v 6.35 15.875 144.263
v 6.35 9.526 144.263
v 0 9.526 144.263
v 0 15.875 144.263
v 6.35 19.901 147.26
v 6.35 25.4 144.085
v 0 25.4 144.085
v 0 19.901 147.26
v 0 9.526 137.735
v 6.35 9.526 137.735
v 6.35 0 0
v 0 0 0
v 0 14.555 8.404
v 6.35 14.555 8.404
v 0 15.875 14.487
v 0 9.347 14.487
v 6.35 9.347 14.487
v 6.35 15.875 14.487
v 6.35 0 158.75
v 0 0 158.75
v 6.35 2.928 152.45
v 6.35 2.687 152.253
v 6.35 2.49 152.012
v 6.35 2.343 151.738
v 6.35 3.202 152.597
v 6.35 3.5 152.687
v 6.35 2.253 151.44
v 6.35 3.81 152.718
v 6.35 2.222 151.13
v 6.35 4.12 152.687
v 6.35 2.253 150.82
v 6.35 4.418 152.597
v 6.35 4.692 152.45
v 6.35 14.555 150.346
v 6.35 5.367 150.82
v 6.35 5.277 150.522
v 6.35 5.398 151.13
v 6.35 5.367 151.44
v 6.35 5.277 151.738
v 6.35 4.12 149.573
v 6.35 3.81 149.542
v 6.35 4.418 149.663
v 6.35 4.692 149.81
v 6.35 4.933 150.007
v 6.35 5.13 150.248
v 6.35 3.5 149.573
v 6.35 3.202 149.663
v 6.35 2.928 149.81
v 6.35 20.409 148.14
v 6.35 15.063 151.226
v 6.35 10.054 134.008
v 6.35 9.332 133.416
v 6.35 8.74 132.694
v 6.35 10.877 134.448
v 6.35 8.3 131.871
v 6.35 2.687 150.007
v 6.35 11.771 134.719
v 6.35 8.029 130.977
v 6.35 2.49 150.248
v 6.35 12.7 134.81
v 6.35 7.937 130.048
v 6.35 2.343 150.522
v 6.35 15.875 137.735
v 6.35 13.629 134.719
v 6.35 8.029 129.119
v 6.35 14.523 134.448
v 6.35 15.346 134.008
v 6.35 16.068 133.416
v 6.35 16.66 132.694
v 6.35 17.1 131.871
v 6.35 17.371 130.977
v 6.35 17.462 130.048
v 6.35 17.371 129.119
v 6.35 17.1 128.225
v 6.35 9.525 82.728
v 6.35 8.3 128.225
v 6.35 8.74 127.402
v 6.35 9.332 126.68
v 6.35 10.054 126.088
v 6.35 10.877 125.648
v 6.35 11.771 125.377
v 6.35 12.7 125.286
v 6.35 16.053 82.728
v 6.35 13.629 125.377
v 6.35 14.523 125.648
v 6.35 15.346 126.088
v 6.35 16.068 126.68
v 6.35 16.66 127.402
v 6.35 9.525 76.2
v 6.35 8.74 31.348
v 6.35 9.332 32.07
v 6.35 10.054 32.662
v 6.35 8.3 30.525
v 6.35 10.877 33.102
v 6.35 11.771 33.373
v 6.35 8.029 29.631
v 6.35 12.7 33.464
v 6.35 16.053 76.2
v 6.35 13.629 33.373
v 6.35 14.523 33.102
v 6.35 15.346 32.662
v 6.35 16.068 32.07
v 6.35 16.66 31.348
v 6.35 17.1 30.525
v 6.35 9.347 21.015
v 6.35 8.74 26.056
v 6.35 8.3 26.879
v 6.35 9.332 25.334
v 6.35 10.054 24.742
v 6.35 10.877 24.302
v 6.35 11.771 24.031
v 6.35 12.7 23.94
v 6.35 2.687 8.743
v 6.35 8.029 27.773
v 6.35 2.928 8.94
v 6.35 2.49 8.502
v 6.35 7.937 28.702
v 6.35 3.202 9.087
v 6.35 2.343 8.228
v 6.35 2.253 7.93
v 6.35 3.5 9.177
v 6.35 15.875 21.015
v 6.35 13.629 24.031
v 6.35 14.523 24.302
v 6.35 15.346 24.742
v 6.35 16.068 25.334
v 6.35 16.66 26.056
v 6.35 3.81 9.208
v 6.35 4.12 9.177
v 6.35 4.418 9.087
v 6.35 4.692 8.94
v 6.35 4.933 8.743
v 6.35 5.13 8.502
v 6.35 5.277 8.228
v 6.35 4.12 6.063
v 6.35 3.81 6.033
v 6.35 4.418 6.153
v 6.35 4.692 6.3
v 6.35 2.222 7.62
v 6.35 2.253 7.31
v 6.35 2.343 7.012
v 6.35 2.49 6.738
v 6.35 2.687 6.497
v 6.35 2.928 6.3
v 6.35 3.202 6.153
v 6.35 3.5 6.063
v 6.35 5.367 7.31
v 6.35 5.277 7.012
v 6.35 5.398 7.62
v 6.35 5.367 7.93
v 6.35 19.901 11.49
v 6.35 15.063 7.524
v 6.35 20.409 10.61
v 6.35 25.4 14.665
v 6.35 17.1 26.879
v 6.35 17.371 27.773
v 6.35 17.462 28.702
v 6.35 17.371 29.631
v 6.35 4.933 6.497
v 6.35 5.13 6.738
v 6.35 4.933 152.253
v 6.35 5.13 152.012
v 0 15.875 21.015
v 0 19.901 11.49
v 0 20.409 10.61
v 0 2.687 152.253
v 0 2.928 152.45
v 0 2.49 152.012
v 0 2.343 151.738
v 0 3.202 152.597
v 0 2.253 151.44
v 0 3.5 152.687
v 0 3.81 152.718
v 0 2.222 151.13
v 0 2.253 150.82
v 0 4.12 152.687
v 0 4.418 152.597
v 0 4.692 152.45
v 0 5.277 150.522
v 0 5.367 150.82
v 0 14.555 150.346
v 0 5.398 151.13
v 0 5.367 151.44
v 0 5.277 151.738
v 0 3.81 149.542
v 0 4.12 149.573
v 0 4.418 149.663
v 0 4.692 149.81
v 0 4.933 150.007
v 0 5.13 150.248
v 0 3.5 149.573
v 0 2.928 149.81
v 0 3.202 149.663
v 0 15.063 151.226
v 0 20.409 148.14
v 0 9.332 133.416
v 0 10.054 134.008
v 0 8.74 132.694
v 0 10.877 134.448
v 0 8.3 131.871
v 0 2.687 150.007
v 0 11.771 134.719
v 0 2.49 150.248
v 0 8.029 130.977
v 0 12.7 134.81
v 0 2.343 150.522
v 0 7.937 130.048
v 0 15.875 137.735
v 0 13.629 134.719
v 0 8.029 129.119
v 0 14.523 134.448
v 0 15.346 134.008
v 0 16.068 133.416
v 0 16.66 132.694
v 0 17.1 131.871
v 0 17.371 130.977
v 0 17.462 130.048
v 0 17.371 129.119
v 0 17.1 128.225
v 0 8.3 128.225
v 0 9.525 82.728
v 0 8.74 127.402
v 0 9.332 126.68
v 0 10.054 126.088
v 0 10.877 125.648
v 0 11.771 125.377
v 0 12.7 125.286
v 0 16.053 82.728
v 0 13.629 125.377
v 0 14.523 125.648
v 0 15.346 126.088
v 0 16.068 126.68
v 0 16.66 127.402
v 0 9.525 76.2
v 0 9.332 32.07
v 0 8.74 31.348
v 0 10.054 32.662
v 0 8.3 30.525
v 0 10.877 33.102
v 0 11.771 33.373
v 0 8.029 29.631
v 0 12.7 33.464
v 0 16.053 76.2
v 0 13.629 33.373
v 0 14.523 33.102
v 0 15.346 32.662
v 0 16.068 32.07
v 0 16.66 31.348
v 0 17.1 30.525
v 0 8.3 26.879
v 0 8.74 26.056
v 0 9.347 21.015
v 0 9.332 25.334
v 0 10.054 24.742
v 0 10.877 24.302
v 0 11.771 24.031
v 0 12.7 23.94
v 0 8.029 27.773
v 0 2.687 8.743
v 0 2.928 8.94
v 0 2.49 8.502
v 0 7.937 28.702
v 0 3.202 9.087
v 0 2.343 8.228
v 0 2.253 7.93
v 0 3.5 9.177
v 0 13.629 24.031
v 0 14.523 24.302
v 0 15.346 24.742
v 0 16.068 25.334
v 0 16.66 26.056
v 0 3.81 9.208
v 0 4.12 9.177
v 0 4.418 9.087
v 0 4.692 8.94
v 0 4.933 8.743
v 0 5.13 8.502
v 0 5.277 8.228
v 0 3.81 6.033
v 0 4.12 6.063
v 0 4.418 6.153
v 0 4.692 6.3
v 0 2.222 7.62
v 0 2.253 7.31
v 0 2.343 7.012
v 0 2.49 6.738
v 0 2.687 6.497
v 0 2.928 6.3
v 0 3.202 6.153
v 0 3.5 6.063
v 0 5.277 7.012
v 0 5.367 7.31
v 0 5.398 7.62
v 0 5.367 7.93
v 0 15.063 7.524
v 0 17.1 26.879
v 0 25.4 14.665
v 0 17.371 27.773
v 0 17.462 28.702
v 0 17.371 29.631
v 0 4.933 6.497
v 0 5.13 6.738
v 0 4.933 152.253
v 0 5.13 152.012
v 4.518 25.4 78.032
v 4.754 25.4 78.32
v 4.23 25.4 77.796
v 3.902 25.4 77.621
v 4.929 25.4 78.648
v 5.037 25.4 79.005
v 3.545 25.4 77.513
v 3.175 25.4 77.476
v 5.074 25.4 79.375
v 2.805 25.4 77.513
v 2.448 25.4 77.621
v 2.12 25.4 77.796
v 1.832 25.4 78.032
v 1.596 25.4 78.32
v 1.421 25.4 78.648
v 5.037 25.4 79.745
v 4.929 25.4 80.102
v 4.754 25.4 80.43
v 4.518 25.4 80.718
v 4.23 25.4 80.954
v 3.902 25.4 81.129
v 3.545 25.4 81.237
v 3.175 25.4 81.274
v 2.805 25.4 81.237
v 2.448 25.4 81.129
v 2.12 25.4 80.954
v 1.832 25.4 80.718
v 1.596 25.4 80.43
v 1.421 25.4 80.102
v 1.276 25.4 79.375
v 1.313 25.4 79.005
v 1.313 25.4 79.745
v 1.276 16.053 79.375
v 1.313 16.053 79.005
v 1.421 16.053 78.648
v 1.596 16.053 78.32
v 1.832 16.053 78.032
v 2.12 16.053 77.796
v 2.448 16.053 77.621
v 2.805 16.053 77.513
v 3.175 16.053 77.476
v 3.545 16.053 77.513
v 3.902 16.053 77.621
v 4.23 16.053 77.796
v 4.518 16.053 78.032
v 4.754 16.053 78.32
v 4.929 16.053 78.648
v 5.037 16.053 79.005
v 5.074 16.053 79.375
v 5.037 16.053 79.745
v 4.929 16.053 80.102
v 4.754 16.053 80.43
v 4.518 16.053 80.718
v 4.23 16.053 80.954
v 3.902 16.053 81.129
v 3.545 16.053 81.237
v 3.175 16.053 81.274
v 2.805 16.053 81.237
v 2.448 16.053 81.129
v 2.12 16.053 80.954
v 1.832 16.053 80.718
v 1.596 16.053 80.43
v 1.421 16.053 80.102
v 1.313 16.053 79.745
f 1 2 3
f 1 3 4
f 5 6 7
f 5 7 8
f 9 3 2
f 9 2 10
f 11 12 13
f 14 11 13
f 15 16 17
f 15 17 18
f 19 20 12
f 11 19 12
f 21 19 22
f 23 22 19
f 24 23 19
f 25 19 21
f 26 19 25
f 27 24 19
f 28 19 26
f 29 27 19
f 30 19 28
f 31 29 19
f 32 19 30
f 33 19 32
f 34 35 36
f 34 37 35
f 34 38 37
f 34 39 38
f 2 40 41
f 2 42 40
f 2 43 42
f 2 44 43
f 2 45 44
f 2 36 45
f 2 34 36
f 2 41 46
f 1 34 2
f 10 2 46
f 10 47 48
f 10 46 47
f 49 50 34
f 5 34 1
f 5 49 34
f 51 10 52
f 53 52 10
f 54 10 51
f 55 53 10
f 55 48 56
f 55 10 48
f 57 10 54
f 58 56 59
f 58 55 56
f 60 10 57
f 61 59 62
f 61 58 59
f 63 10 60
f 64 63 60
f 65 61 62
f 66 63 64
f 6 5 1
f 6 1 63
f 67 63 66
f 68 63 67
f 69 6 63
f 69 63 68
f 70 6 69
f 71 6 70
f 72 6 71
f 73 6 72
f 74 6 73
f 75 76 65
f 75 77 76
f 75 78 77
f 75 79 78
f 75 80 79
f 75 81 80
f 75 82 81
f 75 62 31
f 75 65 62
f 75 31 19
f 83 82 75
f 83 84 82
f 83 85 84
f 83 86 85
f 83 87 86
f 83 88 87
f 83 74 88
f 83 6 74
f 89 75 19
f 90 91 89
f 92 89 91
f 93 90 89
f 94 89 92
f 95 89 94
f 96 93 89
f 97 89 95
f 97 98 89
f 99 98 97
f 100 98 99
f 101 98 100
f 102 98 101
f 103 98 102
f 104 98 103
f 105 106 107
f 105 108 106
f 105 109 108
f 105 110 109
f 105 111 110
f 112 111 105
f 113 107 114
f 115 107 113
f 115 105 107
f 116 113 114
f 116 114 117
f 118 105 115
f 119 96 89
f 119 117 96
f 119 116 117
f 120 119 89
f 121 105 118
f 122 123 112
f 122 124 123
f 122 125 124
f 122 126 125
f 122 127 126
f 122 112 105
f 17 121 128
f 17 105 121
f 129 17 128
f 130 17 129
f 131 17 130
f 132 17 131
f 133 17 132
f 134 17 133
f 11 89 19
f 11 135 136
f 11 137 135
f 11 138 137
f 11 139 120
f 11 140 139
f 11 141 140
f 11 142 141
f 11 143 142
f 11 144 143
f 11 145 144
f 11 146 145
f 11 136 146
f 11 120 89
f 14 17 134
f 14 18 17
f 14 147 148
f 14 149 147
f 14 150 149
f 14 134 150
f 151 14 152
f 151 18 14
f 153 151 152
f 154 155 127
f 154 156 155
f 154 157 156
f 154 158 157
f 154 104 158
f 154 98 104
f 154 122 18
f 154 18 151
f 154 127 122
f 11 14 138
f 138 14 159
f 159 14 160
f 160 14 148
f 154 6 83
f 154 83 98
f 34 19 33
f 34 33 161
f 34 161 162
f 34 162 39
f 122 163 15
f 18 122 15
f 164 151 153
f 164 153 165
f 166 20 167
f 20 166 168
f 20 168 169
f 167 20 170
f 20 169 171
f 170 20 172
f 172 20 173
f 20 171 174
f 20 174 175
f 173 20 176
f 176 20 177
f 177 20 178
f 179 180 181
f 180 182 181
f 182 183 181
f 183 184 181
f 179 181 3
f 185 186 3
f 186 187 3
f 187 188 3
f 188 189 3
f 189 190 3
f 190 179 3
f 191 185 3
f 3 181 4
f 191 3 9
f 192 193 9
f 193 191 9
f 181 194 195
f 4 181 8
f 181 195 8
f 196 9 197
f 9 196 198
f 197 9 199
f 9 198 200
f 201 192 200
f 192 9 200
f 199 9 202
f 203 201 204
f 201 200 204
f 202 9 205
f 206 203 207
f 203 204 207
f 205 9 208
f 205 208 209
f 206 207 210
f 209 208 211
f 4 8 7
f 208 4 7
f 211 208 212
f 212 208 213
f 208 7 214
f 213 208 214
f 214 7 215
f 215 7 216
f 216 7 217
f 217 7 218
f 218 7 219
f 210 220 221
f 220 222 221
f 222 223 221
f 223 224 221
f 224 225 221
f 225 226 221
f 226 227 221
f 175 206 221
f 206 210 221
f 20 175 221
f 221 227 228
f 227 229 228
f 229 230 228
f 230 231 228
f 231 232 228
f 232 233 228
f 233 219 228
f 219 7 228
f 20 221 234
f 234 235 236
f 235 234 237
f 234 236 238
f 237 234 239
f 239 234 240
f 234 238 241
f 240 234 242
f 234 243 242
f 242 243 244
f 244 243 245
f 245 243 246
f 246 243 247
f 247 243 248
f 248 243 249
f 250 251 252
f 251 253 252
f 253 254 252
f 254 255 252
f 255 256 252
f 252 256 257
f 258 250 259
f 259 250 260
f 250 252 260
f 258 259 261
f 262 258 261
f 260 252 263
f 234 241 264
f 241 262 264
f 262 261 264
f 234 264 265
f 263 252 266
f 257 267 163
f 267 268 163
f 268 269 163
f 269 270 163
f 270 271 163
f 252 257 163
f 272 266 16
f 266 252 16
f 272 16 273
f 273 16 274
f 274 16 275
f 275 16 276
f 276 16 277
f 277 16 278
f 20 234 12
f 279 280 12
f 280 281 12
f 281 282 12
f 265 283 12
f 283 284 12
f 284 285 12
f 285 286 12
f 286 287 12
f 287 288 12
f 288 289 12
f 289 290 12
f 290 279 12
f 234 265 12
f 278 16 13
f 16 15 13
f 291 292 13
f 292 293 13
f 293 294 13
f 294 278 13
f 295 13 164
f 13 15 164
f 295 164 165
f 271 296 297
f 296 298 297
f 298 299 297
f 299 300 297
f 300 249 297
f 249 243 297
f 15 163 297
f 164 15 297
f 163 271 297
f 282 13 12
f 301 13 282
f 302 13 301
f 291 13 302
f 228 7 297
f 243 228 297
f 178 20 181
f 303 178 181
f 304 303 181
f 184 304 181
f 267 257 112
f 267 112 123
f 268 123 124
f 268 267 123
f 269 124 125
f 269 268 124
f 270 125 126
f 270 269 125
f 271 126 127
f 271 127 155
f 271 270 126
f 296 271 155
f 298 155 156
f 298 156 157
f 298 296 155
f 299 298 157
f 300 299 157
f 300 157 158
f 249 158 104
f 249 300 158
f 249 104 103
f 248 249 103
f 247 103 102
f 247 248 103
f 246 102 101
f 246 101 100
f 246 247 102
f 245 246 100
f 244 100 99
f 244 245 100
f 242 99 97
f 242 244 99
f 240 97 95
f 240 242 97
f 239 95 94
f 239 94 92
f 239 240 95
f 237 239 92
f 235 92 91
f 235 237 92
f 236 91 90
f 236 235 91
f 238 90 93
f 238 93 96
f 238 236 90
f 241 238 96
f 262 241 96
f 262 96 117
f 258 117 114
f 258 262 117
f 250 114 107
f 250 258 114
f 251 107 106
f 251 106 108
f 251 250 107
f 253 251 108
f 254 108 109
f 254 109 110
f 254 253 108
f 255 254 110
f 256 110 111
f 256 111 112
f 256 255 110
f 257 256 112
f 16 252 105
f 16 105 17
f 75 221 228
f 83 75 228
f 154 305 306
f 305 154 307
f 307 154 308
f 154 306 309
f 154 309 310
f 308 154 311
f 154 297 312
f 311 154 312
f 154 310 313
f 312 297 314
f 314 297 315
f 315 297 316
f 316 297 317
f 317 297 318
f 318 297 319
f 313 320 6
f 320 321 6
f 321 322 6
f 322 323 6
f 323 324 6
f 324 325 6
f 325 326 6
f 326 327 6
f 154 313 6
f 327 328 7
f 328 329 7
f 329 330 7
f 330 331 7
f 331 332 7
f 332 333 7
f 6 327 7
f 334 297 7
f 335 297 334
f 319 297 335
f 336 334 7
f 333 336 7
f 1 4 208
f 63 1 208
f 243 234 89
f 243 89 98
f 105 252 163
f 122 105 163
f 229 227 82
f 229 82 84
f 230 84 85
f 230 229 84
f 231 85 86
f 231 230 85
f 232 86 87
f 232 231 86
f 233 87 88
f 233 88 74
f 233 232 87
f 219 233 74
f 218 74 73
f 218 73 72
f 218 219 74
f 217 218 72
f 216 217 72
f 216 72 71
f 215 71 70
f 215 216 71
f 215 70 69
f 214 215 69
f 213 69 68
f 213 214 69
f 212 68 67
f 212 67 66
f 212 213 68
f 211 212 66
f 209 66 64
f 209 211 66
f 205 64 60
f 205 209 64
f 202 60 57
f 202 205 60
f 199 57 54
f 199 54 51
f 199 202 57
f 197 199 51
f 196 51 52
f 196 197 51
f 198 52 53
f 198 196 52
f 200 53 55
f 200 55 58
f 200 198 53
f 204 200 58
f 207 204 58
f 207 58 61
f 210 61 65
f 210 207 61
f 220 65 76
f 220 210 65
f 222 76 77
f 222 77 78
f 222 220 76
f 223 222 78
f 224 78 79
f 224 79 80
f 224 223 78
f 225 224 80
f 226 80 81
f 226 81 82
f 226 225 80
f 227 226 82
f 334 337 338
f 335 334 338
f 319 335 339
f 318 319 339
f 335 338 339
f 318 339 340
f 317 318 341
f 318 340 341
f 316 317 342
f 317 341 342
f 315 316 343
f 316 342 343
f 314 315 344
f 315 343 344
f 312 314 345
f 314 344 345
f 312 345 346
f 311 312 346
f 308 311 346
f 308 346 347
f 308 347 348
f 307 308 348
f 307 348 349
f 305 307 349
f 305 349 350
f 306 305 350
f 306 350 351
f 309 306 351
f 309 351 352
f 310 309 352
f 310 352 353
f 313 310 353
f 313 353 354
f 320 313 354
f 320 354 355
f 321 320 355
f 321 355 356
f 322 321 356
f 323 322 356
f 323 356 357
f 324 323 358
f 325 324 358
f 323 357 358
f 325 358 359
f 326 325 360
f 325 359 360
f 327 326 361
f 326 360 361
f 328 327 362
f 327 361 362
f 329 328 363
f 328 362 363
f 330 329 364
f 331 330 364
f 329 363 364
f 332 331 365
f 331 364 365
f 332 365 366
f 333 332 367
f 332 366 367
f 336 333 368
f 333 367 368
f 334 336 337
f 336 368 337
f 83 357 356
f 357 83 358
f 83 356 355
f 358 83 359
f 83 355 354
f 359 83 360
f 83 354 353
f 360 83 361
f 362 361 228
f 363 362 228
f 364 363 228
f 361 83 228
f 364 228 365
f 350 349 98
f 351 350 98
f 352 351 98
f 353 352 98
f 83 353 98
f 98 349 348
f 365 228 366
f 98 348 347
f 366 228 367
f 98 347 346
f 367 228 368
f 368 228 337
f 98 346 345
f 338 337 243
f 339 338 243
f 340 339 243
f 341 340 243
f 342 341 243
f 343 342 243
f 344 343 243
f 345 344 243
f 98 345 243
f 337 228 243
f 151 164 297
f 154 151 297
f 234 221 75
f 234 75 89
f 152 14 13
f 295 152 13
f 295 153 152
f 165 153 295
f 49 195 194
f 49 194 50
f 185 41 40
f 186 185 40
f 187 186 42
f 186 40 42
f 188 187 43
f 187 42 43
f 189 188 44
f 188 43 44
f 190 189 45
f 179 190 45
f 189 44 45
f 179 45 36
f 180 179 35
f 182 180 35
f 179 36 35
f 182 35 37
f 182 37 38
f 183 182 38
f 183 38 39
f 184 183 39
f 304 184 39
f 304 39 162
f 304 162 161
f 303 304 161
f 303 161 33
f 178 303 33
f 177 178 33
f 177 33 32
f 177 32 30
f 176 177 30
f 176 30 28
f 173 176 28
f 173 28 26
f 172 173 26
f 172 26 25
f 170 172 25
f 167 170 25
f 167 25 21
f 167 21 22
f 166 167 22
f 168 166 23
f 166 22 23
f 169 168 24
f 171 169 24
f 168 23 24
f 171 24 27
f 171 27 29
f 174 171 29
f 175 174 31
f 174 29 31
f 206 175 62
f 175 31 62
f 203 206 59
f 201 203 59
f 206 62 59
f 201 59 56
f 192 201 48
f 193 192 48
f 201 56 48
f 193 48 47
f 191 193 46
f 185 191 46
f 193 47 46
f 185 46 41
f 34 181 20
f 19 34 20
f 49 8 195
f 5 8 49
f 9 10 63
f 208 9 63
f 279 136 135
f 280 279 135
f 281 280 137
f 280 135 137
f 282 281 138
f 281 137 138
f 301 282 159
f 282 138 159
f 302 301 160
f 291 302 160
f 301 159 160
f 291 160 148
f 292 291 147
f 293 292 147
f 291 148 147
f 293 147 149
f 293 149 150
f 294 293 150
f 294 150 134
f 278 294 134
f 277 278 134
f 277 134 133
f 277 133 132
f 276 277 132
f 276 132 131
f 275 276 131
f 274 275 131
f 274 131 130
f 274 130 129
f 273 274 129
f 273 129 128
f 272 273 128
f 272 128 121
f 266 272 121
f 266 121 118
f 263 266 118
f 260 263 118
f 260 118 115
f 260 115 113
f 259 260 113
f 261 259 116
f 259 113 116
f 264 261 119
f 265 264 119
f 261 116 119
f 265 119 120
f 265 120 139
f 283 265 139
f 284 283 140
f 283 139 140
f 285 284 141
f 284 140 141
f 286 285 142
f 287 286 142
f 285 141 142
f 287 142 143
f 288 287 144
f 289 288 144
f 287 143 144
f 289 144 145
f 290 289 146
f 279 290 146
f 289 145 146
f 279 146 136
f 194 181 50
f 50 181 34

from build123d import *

# Parameters (mm, degrees)
SKETCH1_R                 = 4.7625
SKETCH1_W                 = 6.5278
SKETCH1_H                 = 6.5278
SKETCH1_H_2               = 6.348837221
BOSS_EXTRUDE1_DEPTH       = 6.35
F_6_CLEARANCE_HOLE1_D     = 3.7973
F_6_CLEARANCE_HOLE1_DEPTH = 12.7
F_6_CLEARANCE_HOLE1_TIP   = 1.140824014
SKETCH7_W                 = 6.35
SKETCH7_H                 = 6.1722
BOSS_EXTRUDE2_DEPTH       = 1.016
SKETCH8_W                 = 6.35
SKETCH8_H                 = 6.1722
BOSS_EXTRUDE3_DEPTH       = 1.016
SKETCH9_R                 = 1.5875
CUT_EXTRUDE1_DEPTH        = 161.894515133


with BuildPart() as part:
    # Sketch1 → Boss-Extrude1 (new body)
    with BuildSketch(Plane(origin=(0, 0, 0), x_dir=(0, 0, -1), z_dir=(1, 0, 0))):
        Polygon((0, 0), (-14.664696837, 25.4), (-144.085303163, 25.4), (-158.75, 0), align=None)
        with Locations((-130.048, 12.7)):
            Circle(SKETCH1_R, mode=Mode.SUBTRACT)
        with Locations((-28.702, 12.7)):
            Circle(SKETCH1_R, mode=Mode.SUBTRACT)
        with Locations((-17.750796837, 12.6111)):
            Rectangle(SKETCH1_W, SKETCH1_H, mode=Mode.SUBTRACT)
        with Locations((-140.999203163, 12.70058139)):
            Rectangle(SKETCH1_W, SKETCH1_H_2, mode=Mode.SUBTRACT)
        with Locations((-79.4639, 12.7889)):
            Rectangle(SKETCH1_W, SKETCH1_H, mode=Mode.SUBTRACT)
    extrude(amount=BOSS_EXTRUDE1_DEPTH)

    # #6 Clearance Hole1
    with Locations(Plane(origin=(0, 25.4, 0), x_dir=(1, 0, 0), z_dir=(0, 1, 0))):
        with Locations((3.175, -79.375)):
            Hole(F_6_CLEARANCE_HOLE1_D / 2, depth=F_6_CLEARANCE_HOLE1_DEPTH)
            with Locations((0, 0, -(F_6_CLEARANCE_HOLE1_DEPTH + F_6_CLEARANCE_HOLE1_TIP / 2))):  # 118° drill point
                Cone(0, F_6_CLEARANCE_HOLE1_D / 2, F_6_CLEARANCE_HOLE1_TIP, mode=Mode.SUBTRACT)

    # Sketch7 → Boss-Extrude2 (add)
    with BuildSketch(Plane(origin=(0, 0, 0), x_dir=(-1, 0, 0), z_dir=(0, 0.499999999999998, -0.8660254037844397))):
        with Locations((-3.175, 19.893293675)):
            Rectangle(SKETCH7_W, SKETCH7_H)
    extrude(amount=BOSS_EXTRUDE2_DEPTH)

    # Sketch8 → Boss-Extrude3 (add)
    with BuildSketch(Plane(origin=(0, 68.740766425, 119.0625), x_dir=(1, 0, 0), z_dir=(0, 0.500000000000004, 0.8660254037844365))):
        with Locations((3.175, -59.481706325)):
            Rectangle(SKETCH8_W, SKETCH8_H)
    extrude(amount=BOSS_EXTRUDE3_DEPTH)

    # Sketch9 → Cut-Extrude1 (cut, through all)
    with BuildSketch(Plane(origin=(6.35, 0, 0), x_dir=(0, 0, -1), z_dir=(1, 0, 0))):
        with Locations((-151.13, 3.81)):
            Circle(SKETCH9_R)
        with Locations((-7.62, 3.81)):
            Circle(SKETCH9_R)
    extrude(amount=-CUT_EXTRUDE1_DEPTH, mode=Mode.SUBTRACT)


solid = part.part
